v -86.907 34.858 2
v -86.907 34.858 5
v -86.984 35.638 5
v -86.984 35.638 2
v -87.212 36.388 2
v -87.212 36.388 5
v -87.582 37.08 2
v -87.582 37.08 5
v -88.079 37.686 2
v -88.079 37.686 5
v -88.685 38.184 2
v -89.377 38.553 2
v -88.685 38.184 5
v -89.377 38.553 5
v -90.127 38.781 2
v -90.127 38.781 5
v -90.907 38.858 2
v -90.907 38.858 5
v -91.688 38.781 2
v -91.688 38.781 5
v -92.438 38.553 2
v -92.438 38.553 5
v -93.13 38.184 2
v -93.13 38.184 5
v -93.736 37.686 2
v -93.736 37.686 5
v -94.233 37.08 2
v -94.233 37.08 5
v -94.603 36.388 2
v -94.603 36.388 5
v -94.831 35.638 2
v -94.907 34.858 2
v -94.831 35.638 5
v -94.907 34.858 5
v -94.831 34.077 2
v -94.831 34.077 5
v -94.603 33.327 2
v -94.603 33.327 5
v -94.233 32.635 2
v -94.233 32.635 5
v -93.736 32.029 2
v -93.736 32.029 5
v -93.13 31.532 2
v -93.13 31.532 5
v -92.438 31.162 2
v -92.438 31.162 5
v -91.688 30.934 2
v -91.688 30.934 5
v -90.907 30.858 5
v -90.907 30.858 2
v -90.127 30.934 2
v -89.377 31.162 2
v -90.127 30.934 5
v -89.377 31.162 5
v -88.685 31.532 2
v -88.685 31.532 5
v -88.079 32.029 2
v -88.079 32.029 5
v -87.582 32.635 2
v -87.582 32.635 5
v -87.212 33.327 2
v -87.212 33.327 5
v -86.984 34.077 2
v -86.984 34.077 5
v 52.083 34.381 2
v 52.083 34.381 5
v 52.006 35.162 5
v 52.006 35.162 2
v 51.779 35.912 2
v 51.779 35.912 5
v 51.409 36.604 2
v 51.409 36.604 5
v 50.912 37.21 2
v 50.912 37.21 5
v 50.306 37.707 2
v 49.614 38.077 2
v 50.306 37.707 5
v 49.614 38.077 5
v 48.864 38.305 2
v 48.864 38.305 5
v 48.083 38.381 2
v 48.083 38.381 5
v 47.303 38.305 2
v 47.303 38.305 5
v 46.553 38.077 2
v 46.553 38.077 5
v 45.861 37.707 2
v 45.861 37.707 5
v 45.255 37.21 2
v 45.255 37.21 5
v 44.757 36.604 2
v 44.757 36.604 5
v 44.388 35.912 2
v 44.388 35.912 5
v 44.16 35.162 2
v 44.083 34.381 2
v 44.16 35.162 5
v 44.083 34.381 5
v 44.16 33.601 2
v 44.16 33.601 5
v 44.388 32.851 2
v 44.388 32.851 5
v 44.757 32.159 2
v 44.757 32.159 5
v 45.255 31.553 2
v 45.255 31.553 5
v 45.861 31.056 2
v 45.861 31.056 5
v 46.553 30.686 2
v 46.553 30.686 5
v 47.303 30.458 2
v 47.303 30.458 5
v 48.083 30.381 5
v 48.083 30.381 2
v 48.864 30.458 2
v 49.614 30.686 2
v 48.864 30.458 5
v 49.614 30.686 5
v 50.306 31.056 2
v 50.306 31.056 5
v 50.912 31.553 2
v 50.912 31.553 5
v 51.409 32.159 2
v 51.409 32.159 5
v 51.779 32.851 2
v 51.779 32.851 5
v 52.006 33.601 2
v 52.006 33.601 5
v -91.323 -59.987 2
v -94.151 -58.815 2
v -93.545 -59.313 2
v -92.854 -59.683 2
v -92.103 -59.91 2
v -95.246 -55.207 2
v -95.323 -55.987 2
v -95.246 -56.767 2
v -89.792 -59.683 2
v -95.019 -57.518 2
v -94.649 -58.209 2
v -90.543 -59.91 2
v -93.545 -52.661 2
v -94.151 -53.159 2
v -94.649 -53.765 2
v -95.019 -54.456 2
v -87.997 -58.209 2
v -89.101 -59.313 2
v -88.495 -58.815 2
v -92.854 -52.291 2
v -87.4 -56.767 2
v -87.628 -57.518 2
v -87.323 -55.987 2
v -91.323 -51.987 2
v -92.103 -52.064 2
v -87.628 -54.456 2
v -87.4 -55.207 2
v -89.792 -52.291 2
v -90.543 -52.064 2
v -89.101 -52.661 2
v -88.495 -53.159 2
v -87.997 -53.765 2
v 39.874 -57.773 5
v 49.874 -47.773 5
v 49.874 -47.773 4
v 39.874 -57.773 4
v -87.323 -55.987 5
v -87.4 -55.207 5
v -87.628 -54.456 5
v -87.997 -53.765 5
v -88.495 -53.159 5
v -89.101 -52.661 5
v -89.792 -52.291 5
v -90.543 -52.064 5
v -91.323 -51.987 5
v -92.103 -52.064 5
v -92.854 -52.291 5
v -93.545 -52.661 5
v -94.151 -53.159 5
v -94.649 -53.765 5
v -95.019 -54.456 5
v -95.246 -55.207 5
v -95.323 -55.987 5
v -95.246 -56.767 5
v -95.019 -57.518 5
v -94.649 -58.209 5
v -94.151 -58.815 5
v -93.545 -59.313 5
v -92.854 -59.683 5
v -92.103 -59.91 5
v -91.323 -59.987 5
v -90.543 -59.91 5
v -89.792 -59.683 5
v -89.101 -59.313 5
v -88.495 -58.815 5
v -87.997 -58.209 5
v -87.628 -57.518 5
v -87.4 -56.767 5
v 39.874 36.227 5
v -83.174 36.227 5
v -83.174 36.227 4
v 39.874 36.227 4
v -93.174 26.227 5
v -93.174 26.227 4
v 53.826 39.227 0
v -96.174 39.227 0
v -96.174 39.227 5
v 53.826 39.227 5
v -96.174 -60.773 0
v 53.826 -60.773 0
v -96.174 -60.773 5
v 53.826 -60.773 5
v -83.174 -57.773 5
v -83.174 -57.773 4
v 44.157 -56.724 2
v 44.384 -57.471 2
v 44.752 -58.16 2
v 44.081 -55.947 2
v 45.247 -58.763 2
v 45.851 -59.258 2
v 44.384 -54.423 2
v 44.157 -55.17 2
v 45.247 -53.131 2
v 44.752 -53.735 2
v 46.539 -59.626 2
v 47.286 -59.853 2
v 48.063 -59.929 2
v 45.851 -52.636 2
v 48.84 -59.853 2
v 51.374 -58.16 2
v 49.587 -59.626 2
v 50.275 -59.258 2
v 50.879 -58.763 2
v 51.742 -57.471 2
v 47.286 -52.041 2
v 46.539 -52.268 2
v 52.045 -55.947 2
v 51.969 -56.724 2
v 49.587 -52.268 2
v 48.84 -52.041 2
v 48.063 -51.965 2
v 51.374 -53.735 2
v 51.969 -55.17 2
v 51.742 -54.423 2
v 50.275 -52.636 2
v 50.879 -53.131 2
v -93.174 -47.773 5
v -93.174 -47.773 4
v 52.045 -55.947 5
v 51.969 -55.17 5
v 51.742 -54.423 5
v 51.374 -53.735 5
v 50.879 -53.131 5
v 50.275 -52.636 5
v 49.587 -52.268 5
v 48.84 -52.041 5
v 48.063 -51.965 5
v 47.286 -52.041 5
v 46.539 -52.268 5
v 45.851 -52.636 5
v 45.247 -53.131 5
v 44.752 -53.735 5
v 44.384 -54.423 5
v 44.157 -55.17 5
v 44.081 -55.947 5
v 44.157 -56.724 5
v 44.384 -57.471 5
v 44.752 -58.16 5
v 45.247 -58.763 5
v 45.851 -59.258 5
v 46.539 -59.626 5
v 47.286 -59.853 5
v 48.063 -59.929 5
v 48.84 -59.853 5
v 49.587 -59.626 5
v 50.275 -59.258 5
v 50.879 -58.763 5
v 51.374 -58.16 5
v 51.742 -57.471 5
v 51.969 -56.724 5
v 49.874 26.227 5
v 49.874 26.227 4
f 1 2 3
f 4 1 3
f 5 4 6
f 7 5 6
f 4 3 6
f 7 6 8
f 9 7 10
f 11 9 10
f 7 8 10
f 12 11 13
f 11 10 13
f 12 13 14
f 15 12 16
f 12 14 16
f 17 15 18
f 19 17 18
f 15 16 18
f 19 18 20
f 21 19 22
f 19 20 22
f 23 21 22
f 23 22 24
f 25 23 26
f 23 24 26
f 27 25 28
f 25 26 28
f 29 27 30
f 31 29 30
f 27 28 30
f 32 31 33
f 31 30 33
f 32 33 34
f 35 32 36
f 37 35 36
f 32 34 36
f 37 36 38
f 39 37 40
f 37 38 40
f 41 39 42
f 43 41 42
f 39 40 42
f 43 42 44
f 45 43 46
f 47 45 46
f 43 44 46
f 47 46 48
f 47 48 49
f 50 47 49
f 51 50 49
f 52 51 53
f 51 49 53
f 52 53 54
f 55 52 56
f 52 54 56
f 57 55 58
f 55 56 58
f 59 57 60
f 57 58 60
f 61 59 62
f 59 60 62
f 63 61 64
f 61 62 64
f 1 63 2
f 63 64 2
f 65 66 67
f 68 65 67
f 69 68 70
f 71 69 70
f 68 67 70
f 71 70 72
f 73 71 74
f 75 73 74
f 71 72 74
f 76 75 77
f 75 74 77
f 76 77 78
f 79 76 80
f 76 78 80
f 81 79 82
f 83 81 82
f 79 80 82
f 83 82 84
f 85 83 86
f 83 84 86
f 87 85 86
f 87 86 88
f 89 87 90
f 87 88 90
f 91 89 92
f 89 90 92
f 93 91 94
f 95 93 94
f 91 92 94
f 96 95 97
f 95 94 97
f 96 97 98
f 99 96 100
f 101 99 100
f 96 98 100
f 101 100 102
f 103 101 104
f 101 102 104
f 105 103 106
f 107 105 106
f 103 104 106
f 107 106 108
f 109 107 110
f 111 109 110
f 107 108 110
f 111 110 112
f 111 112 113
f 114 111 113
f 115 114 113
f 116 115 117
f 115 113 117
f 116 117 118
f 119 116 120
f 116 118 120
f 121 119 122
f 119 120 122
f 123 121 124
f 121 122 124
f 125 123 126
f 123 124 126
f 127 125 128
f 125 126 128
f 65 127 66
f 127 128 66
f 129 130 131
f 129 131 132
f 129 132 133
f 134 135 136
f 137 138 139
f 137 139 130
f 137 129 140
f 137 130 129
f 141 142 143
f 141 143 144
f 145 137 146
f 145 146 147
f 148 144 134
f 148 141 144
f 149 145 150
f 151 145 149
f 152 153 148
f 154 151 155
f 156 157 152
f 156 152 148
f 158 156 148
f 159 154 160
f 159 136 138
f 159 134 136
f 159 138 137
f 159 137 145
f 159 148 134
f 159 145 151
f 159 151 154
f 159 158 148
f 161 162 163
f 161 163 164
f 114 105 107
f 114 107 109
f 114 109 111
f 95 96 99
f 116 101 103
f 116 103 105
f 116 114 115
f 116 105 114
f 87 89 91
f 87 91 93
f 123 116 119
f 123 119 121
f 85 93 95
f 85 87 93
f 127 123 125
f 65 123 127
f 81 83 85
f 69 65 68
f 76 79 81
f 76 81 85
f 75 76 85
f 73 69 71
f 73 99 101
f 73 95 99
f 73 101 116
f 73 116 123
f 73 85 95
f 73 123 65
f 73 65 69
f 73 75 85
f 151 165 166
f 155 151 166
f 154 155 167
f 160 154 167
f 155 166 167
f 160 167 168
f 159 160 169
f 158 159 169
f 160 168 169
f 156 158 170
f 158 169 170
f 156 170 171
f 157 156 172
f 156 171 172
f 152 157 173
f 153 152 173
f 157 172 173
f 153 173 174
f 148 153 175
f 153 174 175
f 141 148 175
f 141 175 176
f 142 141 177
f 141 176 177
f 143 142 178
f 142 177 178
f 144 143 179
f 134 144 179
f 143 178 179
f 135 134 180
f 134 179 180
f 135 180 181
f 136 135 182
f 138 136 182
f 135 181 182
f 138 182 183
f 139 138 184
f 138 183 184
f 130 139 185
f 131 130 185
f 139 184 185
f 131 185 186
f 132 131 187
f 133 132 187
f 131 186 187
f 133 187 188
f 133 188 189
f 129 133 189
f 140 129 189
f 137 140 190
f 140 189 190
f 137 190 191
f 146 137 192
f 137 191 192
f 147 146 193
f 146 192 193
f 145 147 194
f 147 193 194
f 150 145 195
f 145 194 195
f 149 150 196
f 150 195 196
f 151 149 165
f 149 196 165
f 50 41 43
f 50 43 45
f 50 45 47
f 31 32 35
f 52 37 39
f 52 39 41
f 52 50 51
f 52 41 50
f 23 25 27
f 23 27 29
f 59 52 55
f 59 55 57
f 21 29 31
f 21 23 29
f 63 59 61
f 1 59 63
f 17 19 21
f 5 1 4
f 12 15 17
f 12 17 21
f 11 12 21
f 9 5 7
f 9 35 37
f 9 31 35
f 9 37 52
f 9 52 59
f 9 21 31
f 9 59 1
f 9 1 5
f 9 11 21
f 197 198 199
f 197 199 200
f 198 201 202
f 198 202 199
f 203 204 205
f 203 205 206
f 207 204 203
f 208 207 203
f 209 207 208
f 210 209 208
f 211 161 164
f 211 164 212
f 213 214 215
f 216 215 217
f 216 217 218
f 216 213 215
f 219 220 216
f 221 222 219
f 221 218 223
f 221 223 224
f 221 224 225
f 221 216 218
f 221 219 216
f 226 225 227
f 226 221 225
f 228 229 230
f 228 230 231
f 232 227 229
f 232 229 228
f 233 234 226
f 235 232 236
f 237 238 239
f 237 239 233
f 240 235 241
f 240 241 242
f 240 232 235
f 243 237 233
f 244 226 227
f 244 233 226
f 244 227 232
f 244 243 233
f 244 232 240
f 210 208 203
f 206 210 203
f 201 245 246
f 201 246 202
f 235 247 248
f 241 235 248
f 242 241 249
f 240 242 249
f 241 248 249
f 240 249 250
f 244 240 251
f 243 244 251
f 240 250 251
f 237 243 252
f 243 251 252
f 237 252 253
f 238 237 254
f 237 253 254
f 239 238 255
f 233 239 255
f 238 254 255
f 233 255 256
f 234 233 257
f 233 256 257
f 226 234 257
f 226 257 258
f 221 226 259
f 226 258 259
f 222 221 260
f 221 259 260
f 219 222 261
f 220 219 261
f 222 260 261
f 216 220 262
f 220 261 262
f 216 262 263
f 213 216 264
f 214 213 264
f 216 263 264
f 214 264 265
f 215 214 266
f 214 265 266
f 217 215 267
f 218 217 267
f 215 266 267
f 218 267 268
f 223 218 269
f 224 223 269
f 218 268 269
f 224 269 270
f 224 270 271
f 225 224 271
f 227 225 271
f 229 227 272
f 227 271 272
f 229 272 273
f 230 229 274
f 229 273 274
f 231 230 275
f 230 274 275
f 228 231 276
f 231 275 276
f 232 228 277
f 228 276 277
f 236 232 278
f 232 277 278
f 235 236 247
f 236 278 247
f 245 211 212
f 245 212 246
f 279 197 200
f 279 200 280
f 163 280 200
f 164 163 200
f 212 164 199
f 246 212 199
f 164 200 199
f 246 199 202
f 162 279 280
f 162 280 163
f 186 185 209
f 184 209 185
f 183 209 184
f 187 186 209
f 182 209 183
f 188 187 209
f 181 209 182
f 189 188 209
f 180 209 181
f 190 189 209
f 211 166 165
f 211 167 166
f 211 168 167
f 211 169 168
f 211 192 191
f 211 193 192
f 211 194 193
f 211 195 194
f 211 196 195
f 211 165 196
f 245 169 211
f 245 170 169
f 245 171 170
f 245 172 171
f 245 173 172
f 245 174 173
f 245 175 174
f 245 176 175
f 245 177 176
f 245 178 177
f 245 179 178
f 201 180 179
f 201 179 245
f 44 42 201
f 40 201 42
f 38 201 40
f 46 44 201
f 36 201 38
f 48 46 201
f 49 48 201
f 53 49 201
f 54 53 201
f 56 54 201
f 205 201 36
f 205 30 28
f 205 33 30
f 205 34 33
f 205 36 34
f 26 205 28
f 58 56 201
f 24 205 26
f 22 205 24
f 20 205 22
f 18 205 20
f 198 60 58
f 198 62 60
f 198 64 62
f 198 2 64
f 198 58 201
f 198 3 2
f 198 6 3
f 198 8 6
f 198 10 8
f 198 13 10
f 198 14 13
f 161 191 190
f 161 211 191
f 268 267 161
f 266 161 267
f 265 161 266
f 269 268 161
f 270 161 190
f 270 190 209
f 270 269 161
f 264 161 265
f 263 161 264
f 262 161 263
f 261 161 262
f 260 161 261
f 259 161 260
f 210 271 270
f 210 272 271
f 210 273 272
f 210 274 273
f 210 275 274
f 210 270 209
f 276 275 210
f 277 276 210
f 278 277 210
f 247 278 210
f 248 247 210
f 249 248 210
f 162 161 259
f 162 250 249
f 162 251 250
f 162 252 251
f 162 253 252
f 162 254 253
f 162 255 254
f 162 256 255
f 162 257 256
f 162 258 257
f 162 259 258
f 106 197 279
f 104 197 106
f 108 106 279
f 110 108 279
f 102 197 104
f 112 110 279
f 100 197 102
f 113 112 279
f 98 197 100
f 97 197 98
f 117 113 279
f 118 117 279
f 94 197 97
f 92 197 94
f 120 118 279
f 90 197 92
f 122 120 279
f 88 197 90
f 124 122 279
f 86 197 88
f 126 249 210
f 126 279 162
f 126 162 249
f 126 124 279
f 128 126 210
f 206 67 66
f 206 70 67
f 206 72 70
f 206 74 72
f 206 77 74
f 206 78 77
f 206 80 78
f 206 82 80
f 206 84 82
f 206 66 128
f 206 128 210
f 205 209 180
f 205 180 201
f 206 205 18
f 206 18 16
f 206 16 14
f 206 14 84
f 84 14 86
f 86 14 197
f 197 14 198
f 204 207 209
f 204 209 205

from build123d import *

# Parameters (mm, degrees)
ESQUISSE1_W              = 150
ESQUISSE1_H              = 100
BOSS_EXTRU_1_DEPTH       = 5
ENL_V_MAT_EXTRU_1_DEPTH  = 1
ESQUISSE3_R              = 4
ENL_V_MAT_EXTRU_2_DEPTH  = 3
ESQUISSE6_R              = 4
ENL_V_MAT_EXTRU_6_DEPTH  = 3
ESQUISSE7_R              = 4
ENL_V_MAT_EXTRU_8_DEPTH  = 3
ESQUISSE8_R              = 3.982204299
ENL_V_MAT_EXTRU_10_DEPTH = 3


with BuildPart() as part:
    # Esquisse1 → Boss.-Extru.1 (new body)
    with BuildSketch(Plane.XY):
        with Locations((-21.17373101, -10.772659733)):
            Rectangle(ESQUISSE1_W, ESQUISSE1_H)
    extrude(amount=BOSS_EXTRU_1_DEPTH)

    # Esquisse2 → Enlèv. mat.-Extru.1 (cut)
    with BuildSketch(Plane.XY.offset(5)):
        Polygon((-83.17373101, 36.227340267), (39.87366547, 36.227340267), (49.87366547, 26.227340267), (49.87366547, -47.772659733), (39.87366547, -57.772659733), (-83.17373101, -57.772659733), (-93.17373101, -47.772659733), (-93.17373101, 26.227340267), align=None)
    extrude(amount=-ENL_V_MAT_EXTRU_1_DEPTH, mode=Mode.SUBTRACT)

    # Esquisse3 → Enlèv. mat.-Extru.2 (cut)
    with BuildSketch(Plane.XY.offset(5)):
        with Locations((-90.907387201, 34.857641034)):
            Circle(ESQUISSE3_R)
    extrude(amount=-ENL_V_MAT_EXTRU_2_DEPTH, mode=Mode.SUBTRACT)

    # Esquisse6 → Enlèv. mat.-Extru.6 (cut)
    with BuildSketch(Plane.XY.offset(5)):
        with Locations((48.083277729, 34.38144698)):
            Circle(ESQUISSE6_R)
    extrude(amount=-ENL_V_MAT_EXTRU_6_DEPTH, mode=Mode.SUBTRACT)

    # Esquisse7 → Enlèv. mat.-Extru.8 (cut)
    with BuildSketch(Plane.XY.offset(5)):
        with Locations((-91.323021124, -55.986982745)):
            Circle(ESQUISSE7_R)
    extrude(amount=-ENL_V_MAT_EXTRU_8_DEPTH, mode=Mode.SUBTRACT)

    # Esquisse8 → Enlèv. mat.-Extru.10 (cut)
    with BuildSketch(Plane.XY.offset(5)):
        with Locations((48.063086484, -55.947185674)):
            Circle(ESQUISSE8_R)
    extrude(amount=-ENL_V_MAT_EXTRU_10_DEPTH, mode=Mode.SUBTRACT)


solid = part.part
